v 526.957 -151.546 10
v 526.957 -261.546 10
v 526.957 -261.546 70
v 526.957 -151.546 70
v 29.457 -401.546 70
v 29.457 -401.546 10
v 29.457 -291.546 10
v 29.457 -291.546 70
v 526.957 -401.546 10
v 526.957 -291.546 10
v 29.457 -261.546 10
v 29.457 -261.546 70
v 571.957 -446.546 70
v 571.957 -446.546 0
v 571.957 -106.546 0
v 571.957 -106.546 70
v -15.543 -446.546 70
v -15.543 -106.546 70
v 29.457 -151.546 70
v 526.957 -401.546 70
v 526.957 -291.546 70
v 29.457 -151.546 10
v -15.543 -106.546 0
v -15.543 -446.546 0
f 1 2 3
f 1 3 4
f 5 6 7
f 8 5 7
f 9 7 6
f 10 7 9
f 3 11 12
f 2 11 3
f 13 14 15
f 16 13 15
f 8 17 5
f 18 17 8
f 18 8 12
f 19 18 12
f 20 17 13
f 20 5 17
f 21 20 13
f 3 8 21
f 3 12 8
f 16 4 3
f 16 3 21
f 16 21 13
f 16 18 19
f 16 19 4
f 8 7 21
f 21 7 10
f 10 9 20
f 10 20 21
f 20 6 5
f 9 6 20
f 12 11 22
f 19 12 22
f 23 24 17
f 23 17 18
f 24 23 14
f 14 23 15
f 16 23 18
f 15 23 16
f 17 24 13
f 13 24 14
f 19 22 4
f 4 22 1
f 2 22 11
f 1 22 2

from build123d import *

# Parameters (mm, degrees)
SKETCH_W     = 587.5
SKETCH_H     = 340
PAD_DEPTH    = 10
SKETCH001_W  = 587.5
SKETCH001_H  = 45
PAD001_DEPTH = 60
SKETCH002_W  = 587.5
SKETCH002_H  = 45
PAD002_DEPTH = 60
SKETCH003_W  = 45
SKETCH003_H  = 250
PAD003_DEPTH = 60
SKETCH004_W  = 45
SKETCH004_H  = 250
PAD004_DEPTH = 60
SKETCH005_W  = 497.5
SKETCH005_H  = 30
PAD005_DEPTH = 60


with BuildPart() as part:
    # Sketch → Pad (new body)
    with BuildSketch(Plane.XY):
        with Locations((278.206882, -276.545756)):
            Rectangle(SKETCH_W, SKETCH_H)
    extrude(amount=PAD_DEPTH)

    # Sketch001 (on Face6 of Pad) → Pad001 (join)
    with BuildSketch(Plane.XY.offset(10)):
        with Locations((278.206882, -129.045756)):
            Rectangle(SKETCH001_W, SKETCH001_H)
    extrude(amount=PAD001_DEPTH)

    # Sketch002 (on Face3 of Pad001) → Pad002 (join)
    with BuildSketch(Plane.XY.offset(10)):
        with Locations((278.206882, -424.045756)):
            Rectangle(SKETCH002_W, SKETCH002_H)
    extrude(amount=PAD002_DEPTH)

    # Sketch003 (on Face3 of Pad002) → Pad003 (join)
    with BuildSketch(Plane.XY.offset(10)):
        with Locations((6.956882, -276.545756)):
            Rectangle(SKETCH003_W, SKETCH003_H)
    extrude(amount=PAD003_DEPTH)

    # Sketch004 (on Face6 of Pad003) → Pad004 (join)
    with BuildSketch(Plane.XY.offset(10)):
        with Locations((549.456882, -276.545756)):
            Rectangle(SKETCH004_W, SKETCH004_H)
    extrude(amount=PAD004_DEPTH)

    # Sketch005 (on Face11 of Pad004) → Pad005 (join)
    with BuildSketch(Plane.XY.offset(10)):
        with Locations((278.206882, -276.545756)):
            Rectangle(SKETCH005_W, SKETCH005_H)
    extrude(amount=PAD005_DEPTH)


solid = part.part
